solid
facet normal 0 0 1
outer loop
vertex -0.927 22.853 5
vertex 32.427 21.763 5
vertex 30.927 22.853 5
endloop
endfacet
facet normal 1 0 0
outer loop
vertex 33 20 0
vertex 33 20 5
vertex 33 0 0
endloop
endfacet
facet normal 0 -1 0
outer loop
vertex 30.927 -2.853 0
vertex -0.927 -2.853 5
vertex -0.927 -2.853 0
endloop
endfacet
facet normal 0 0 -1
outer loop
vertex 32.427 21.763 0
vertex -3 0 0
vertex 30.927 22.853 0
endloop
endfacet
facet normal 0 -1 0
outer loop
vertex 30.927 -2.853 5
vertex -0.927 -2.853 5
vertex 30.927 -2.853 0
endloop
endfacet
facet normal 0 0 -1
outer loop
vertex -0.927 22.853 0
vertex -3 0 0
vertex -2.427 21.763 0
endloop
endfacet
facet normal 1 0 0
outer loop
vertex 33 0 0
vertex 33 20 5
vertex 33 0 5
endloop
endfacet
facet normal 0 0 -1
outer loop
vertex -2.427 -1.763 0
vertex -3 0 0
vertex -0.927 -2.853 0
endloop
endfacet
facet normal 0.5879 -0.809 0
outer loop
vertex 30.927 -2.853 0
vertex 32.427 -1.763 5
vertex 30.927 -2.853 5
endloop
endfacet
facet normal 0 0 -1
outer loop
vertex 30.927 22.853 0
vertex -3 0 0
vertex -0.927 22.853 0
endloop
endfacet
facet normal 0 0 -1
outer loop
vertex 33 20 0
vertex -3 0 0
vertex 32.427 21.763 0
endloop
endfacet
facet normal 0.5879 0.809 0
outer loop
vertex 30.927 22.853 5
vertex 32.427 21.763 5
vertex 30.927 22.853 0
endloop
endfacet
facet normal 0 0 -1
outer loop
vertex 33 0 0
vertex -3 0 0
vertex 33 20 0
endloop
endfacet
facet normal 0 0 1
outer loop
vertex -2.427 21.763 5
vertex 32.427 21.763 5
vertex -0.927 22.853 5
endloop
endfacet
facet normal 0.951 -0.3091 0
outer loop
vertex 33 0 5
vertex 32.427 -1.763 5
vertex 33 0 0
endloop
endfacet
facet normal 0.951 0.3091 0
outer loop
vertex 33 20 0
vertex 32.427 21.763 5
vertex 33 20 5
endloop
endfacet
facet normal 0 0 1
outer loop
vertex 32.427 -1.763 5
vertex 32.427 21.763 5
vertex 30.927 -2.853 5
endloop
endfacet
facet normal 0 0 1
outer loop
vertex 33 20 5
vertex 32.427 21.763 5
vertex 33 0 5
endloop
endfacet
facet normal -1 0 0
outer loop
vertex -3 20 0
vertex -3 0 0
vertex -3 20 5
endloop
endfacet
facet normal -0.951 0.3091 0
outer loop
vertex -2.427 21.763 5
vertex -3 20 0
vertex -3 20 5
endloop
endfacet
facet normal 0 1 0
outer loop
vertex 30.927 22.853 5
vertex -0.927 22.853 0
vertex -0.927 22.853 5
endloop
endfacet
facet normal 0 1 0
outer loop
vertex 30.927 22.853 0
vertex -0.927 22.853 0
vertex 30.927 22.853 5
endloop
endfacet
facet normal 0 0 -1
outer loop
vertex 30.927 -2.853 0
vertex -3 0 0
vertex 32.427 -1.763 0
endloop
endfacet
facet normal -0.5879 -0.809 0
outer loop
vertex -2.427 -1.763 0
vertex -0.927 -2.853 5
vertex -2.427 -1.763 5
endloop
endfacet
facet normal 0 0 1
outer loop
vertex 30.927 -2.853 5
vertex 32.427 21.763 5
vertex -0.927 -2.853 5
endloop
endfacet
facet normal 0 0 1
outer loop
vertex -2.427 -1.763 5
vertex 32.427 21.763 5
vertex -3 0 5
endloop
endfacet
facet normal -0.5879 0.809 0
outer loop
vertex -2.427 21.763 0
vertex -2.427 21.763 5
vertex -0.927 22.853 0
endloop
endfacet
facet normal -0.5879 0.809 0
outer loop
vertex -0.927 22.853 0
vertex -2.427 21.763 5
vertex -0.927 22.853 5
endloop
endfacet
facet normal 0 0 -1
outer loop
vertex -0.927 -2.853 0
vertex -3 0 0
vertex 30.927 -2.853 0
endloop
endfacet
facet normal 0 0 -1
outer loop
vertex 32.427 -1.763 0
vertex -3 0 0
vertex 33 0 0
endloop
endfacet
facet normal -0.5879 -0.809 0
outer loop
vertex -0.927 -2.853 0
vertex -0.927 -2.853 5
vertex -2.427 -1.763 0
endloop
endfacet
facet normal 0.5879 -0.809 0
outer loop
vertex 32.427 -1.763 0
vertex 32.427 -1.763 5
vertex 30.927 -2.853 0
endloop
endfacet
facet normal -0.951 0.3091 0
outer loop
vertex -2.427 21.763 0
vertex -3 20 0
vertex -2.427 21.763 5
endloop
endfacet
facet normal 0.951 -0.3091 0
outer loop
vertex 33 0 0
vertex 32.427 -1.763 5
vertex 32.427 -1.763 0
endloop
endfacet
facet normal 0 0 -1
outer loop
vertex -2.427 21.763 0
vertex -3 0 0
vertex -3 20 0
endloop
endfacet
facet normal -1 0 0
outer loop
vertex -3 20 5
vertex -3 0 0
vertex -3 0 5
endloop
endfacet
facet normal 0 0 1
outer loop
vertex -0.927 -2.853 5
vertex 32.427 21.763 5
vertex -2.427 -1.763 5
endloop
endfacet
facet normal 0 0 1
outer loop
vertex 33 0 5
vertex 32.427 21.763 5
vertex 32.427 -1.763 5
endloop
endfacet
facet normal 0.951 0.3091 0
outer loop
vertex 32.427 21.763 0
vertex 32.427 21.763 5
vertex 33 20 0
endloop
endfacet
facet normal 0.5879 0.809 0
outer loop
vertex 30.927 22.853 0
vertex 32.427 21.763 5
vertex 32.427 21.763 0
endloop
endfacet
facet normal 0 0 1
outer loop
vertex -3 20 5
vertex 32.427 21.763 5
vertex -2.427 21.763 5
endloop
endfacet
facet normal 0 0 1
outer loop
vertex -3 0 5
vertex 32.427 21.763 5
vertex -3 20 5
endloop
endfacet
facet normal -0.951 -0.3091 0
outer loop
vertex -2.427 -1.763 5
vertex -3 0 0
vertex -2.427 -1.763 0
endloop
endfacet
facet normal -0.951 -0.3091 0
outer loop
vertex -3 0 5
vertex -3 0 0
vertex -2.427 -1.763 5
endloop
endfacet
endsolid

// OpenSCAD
// scad-hull-minkowski.md case 01: the rounded-corner plate. Both children are prisms along Z,
// so the sum is the 2D sum of the sections extruded: 6 planes + 4 true r=3 cylinders.
minkowski() { cube([30, 20, 4]); cylinder(r = 3, h = 1); }
